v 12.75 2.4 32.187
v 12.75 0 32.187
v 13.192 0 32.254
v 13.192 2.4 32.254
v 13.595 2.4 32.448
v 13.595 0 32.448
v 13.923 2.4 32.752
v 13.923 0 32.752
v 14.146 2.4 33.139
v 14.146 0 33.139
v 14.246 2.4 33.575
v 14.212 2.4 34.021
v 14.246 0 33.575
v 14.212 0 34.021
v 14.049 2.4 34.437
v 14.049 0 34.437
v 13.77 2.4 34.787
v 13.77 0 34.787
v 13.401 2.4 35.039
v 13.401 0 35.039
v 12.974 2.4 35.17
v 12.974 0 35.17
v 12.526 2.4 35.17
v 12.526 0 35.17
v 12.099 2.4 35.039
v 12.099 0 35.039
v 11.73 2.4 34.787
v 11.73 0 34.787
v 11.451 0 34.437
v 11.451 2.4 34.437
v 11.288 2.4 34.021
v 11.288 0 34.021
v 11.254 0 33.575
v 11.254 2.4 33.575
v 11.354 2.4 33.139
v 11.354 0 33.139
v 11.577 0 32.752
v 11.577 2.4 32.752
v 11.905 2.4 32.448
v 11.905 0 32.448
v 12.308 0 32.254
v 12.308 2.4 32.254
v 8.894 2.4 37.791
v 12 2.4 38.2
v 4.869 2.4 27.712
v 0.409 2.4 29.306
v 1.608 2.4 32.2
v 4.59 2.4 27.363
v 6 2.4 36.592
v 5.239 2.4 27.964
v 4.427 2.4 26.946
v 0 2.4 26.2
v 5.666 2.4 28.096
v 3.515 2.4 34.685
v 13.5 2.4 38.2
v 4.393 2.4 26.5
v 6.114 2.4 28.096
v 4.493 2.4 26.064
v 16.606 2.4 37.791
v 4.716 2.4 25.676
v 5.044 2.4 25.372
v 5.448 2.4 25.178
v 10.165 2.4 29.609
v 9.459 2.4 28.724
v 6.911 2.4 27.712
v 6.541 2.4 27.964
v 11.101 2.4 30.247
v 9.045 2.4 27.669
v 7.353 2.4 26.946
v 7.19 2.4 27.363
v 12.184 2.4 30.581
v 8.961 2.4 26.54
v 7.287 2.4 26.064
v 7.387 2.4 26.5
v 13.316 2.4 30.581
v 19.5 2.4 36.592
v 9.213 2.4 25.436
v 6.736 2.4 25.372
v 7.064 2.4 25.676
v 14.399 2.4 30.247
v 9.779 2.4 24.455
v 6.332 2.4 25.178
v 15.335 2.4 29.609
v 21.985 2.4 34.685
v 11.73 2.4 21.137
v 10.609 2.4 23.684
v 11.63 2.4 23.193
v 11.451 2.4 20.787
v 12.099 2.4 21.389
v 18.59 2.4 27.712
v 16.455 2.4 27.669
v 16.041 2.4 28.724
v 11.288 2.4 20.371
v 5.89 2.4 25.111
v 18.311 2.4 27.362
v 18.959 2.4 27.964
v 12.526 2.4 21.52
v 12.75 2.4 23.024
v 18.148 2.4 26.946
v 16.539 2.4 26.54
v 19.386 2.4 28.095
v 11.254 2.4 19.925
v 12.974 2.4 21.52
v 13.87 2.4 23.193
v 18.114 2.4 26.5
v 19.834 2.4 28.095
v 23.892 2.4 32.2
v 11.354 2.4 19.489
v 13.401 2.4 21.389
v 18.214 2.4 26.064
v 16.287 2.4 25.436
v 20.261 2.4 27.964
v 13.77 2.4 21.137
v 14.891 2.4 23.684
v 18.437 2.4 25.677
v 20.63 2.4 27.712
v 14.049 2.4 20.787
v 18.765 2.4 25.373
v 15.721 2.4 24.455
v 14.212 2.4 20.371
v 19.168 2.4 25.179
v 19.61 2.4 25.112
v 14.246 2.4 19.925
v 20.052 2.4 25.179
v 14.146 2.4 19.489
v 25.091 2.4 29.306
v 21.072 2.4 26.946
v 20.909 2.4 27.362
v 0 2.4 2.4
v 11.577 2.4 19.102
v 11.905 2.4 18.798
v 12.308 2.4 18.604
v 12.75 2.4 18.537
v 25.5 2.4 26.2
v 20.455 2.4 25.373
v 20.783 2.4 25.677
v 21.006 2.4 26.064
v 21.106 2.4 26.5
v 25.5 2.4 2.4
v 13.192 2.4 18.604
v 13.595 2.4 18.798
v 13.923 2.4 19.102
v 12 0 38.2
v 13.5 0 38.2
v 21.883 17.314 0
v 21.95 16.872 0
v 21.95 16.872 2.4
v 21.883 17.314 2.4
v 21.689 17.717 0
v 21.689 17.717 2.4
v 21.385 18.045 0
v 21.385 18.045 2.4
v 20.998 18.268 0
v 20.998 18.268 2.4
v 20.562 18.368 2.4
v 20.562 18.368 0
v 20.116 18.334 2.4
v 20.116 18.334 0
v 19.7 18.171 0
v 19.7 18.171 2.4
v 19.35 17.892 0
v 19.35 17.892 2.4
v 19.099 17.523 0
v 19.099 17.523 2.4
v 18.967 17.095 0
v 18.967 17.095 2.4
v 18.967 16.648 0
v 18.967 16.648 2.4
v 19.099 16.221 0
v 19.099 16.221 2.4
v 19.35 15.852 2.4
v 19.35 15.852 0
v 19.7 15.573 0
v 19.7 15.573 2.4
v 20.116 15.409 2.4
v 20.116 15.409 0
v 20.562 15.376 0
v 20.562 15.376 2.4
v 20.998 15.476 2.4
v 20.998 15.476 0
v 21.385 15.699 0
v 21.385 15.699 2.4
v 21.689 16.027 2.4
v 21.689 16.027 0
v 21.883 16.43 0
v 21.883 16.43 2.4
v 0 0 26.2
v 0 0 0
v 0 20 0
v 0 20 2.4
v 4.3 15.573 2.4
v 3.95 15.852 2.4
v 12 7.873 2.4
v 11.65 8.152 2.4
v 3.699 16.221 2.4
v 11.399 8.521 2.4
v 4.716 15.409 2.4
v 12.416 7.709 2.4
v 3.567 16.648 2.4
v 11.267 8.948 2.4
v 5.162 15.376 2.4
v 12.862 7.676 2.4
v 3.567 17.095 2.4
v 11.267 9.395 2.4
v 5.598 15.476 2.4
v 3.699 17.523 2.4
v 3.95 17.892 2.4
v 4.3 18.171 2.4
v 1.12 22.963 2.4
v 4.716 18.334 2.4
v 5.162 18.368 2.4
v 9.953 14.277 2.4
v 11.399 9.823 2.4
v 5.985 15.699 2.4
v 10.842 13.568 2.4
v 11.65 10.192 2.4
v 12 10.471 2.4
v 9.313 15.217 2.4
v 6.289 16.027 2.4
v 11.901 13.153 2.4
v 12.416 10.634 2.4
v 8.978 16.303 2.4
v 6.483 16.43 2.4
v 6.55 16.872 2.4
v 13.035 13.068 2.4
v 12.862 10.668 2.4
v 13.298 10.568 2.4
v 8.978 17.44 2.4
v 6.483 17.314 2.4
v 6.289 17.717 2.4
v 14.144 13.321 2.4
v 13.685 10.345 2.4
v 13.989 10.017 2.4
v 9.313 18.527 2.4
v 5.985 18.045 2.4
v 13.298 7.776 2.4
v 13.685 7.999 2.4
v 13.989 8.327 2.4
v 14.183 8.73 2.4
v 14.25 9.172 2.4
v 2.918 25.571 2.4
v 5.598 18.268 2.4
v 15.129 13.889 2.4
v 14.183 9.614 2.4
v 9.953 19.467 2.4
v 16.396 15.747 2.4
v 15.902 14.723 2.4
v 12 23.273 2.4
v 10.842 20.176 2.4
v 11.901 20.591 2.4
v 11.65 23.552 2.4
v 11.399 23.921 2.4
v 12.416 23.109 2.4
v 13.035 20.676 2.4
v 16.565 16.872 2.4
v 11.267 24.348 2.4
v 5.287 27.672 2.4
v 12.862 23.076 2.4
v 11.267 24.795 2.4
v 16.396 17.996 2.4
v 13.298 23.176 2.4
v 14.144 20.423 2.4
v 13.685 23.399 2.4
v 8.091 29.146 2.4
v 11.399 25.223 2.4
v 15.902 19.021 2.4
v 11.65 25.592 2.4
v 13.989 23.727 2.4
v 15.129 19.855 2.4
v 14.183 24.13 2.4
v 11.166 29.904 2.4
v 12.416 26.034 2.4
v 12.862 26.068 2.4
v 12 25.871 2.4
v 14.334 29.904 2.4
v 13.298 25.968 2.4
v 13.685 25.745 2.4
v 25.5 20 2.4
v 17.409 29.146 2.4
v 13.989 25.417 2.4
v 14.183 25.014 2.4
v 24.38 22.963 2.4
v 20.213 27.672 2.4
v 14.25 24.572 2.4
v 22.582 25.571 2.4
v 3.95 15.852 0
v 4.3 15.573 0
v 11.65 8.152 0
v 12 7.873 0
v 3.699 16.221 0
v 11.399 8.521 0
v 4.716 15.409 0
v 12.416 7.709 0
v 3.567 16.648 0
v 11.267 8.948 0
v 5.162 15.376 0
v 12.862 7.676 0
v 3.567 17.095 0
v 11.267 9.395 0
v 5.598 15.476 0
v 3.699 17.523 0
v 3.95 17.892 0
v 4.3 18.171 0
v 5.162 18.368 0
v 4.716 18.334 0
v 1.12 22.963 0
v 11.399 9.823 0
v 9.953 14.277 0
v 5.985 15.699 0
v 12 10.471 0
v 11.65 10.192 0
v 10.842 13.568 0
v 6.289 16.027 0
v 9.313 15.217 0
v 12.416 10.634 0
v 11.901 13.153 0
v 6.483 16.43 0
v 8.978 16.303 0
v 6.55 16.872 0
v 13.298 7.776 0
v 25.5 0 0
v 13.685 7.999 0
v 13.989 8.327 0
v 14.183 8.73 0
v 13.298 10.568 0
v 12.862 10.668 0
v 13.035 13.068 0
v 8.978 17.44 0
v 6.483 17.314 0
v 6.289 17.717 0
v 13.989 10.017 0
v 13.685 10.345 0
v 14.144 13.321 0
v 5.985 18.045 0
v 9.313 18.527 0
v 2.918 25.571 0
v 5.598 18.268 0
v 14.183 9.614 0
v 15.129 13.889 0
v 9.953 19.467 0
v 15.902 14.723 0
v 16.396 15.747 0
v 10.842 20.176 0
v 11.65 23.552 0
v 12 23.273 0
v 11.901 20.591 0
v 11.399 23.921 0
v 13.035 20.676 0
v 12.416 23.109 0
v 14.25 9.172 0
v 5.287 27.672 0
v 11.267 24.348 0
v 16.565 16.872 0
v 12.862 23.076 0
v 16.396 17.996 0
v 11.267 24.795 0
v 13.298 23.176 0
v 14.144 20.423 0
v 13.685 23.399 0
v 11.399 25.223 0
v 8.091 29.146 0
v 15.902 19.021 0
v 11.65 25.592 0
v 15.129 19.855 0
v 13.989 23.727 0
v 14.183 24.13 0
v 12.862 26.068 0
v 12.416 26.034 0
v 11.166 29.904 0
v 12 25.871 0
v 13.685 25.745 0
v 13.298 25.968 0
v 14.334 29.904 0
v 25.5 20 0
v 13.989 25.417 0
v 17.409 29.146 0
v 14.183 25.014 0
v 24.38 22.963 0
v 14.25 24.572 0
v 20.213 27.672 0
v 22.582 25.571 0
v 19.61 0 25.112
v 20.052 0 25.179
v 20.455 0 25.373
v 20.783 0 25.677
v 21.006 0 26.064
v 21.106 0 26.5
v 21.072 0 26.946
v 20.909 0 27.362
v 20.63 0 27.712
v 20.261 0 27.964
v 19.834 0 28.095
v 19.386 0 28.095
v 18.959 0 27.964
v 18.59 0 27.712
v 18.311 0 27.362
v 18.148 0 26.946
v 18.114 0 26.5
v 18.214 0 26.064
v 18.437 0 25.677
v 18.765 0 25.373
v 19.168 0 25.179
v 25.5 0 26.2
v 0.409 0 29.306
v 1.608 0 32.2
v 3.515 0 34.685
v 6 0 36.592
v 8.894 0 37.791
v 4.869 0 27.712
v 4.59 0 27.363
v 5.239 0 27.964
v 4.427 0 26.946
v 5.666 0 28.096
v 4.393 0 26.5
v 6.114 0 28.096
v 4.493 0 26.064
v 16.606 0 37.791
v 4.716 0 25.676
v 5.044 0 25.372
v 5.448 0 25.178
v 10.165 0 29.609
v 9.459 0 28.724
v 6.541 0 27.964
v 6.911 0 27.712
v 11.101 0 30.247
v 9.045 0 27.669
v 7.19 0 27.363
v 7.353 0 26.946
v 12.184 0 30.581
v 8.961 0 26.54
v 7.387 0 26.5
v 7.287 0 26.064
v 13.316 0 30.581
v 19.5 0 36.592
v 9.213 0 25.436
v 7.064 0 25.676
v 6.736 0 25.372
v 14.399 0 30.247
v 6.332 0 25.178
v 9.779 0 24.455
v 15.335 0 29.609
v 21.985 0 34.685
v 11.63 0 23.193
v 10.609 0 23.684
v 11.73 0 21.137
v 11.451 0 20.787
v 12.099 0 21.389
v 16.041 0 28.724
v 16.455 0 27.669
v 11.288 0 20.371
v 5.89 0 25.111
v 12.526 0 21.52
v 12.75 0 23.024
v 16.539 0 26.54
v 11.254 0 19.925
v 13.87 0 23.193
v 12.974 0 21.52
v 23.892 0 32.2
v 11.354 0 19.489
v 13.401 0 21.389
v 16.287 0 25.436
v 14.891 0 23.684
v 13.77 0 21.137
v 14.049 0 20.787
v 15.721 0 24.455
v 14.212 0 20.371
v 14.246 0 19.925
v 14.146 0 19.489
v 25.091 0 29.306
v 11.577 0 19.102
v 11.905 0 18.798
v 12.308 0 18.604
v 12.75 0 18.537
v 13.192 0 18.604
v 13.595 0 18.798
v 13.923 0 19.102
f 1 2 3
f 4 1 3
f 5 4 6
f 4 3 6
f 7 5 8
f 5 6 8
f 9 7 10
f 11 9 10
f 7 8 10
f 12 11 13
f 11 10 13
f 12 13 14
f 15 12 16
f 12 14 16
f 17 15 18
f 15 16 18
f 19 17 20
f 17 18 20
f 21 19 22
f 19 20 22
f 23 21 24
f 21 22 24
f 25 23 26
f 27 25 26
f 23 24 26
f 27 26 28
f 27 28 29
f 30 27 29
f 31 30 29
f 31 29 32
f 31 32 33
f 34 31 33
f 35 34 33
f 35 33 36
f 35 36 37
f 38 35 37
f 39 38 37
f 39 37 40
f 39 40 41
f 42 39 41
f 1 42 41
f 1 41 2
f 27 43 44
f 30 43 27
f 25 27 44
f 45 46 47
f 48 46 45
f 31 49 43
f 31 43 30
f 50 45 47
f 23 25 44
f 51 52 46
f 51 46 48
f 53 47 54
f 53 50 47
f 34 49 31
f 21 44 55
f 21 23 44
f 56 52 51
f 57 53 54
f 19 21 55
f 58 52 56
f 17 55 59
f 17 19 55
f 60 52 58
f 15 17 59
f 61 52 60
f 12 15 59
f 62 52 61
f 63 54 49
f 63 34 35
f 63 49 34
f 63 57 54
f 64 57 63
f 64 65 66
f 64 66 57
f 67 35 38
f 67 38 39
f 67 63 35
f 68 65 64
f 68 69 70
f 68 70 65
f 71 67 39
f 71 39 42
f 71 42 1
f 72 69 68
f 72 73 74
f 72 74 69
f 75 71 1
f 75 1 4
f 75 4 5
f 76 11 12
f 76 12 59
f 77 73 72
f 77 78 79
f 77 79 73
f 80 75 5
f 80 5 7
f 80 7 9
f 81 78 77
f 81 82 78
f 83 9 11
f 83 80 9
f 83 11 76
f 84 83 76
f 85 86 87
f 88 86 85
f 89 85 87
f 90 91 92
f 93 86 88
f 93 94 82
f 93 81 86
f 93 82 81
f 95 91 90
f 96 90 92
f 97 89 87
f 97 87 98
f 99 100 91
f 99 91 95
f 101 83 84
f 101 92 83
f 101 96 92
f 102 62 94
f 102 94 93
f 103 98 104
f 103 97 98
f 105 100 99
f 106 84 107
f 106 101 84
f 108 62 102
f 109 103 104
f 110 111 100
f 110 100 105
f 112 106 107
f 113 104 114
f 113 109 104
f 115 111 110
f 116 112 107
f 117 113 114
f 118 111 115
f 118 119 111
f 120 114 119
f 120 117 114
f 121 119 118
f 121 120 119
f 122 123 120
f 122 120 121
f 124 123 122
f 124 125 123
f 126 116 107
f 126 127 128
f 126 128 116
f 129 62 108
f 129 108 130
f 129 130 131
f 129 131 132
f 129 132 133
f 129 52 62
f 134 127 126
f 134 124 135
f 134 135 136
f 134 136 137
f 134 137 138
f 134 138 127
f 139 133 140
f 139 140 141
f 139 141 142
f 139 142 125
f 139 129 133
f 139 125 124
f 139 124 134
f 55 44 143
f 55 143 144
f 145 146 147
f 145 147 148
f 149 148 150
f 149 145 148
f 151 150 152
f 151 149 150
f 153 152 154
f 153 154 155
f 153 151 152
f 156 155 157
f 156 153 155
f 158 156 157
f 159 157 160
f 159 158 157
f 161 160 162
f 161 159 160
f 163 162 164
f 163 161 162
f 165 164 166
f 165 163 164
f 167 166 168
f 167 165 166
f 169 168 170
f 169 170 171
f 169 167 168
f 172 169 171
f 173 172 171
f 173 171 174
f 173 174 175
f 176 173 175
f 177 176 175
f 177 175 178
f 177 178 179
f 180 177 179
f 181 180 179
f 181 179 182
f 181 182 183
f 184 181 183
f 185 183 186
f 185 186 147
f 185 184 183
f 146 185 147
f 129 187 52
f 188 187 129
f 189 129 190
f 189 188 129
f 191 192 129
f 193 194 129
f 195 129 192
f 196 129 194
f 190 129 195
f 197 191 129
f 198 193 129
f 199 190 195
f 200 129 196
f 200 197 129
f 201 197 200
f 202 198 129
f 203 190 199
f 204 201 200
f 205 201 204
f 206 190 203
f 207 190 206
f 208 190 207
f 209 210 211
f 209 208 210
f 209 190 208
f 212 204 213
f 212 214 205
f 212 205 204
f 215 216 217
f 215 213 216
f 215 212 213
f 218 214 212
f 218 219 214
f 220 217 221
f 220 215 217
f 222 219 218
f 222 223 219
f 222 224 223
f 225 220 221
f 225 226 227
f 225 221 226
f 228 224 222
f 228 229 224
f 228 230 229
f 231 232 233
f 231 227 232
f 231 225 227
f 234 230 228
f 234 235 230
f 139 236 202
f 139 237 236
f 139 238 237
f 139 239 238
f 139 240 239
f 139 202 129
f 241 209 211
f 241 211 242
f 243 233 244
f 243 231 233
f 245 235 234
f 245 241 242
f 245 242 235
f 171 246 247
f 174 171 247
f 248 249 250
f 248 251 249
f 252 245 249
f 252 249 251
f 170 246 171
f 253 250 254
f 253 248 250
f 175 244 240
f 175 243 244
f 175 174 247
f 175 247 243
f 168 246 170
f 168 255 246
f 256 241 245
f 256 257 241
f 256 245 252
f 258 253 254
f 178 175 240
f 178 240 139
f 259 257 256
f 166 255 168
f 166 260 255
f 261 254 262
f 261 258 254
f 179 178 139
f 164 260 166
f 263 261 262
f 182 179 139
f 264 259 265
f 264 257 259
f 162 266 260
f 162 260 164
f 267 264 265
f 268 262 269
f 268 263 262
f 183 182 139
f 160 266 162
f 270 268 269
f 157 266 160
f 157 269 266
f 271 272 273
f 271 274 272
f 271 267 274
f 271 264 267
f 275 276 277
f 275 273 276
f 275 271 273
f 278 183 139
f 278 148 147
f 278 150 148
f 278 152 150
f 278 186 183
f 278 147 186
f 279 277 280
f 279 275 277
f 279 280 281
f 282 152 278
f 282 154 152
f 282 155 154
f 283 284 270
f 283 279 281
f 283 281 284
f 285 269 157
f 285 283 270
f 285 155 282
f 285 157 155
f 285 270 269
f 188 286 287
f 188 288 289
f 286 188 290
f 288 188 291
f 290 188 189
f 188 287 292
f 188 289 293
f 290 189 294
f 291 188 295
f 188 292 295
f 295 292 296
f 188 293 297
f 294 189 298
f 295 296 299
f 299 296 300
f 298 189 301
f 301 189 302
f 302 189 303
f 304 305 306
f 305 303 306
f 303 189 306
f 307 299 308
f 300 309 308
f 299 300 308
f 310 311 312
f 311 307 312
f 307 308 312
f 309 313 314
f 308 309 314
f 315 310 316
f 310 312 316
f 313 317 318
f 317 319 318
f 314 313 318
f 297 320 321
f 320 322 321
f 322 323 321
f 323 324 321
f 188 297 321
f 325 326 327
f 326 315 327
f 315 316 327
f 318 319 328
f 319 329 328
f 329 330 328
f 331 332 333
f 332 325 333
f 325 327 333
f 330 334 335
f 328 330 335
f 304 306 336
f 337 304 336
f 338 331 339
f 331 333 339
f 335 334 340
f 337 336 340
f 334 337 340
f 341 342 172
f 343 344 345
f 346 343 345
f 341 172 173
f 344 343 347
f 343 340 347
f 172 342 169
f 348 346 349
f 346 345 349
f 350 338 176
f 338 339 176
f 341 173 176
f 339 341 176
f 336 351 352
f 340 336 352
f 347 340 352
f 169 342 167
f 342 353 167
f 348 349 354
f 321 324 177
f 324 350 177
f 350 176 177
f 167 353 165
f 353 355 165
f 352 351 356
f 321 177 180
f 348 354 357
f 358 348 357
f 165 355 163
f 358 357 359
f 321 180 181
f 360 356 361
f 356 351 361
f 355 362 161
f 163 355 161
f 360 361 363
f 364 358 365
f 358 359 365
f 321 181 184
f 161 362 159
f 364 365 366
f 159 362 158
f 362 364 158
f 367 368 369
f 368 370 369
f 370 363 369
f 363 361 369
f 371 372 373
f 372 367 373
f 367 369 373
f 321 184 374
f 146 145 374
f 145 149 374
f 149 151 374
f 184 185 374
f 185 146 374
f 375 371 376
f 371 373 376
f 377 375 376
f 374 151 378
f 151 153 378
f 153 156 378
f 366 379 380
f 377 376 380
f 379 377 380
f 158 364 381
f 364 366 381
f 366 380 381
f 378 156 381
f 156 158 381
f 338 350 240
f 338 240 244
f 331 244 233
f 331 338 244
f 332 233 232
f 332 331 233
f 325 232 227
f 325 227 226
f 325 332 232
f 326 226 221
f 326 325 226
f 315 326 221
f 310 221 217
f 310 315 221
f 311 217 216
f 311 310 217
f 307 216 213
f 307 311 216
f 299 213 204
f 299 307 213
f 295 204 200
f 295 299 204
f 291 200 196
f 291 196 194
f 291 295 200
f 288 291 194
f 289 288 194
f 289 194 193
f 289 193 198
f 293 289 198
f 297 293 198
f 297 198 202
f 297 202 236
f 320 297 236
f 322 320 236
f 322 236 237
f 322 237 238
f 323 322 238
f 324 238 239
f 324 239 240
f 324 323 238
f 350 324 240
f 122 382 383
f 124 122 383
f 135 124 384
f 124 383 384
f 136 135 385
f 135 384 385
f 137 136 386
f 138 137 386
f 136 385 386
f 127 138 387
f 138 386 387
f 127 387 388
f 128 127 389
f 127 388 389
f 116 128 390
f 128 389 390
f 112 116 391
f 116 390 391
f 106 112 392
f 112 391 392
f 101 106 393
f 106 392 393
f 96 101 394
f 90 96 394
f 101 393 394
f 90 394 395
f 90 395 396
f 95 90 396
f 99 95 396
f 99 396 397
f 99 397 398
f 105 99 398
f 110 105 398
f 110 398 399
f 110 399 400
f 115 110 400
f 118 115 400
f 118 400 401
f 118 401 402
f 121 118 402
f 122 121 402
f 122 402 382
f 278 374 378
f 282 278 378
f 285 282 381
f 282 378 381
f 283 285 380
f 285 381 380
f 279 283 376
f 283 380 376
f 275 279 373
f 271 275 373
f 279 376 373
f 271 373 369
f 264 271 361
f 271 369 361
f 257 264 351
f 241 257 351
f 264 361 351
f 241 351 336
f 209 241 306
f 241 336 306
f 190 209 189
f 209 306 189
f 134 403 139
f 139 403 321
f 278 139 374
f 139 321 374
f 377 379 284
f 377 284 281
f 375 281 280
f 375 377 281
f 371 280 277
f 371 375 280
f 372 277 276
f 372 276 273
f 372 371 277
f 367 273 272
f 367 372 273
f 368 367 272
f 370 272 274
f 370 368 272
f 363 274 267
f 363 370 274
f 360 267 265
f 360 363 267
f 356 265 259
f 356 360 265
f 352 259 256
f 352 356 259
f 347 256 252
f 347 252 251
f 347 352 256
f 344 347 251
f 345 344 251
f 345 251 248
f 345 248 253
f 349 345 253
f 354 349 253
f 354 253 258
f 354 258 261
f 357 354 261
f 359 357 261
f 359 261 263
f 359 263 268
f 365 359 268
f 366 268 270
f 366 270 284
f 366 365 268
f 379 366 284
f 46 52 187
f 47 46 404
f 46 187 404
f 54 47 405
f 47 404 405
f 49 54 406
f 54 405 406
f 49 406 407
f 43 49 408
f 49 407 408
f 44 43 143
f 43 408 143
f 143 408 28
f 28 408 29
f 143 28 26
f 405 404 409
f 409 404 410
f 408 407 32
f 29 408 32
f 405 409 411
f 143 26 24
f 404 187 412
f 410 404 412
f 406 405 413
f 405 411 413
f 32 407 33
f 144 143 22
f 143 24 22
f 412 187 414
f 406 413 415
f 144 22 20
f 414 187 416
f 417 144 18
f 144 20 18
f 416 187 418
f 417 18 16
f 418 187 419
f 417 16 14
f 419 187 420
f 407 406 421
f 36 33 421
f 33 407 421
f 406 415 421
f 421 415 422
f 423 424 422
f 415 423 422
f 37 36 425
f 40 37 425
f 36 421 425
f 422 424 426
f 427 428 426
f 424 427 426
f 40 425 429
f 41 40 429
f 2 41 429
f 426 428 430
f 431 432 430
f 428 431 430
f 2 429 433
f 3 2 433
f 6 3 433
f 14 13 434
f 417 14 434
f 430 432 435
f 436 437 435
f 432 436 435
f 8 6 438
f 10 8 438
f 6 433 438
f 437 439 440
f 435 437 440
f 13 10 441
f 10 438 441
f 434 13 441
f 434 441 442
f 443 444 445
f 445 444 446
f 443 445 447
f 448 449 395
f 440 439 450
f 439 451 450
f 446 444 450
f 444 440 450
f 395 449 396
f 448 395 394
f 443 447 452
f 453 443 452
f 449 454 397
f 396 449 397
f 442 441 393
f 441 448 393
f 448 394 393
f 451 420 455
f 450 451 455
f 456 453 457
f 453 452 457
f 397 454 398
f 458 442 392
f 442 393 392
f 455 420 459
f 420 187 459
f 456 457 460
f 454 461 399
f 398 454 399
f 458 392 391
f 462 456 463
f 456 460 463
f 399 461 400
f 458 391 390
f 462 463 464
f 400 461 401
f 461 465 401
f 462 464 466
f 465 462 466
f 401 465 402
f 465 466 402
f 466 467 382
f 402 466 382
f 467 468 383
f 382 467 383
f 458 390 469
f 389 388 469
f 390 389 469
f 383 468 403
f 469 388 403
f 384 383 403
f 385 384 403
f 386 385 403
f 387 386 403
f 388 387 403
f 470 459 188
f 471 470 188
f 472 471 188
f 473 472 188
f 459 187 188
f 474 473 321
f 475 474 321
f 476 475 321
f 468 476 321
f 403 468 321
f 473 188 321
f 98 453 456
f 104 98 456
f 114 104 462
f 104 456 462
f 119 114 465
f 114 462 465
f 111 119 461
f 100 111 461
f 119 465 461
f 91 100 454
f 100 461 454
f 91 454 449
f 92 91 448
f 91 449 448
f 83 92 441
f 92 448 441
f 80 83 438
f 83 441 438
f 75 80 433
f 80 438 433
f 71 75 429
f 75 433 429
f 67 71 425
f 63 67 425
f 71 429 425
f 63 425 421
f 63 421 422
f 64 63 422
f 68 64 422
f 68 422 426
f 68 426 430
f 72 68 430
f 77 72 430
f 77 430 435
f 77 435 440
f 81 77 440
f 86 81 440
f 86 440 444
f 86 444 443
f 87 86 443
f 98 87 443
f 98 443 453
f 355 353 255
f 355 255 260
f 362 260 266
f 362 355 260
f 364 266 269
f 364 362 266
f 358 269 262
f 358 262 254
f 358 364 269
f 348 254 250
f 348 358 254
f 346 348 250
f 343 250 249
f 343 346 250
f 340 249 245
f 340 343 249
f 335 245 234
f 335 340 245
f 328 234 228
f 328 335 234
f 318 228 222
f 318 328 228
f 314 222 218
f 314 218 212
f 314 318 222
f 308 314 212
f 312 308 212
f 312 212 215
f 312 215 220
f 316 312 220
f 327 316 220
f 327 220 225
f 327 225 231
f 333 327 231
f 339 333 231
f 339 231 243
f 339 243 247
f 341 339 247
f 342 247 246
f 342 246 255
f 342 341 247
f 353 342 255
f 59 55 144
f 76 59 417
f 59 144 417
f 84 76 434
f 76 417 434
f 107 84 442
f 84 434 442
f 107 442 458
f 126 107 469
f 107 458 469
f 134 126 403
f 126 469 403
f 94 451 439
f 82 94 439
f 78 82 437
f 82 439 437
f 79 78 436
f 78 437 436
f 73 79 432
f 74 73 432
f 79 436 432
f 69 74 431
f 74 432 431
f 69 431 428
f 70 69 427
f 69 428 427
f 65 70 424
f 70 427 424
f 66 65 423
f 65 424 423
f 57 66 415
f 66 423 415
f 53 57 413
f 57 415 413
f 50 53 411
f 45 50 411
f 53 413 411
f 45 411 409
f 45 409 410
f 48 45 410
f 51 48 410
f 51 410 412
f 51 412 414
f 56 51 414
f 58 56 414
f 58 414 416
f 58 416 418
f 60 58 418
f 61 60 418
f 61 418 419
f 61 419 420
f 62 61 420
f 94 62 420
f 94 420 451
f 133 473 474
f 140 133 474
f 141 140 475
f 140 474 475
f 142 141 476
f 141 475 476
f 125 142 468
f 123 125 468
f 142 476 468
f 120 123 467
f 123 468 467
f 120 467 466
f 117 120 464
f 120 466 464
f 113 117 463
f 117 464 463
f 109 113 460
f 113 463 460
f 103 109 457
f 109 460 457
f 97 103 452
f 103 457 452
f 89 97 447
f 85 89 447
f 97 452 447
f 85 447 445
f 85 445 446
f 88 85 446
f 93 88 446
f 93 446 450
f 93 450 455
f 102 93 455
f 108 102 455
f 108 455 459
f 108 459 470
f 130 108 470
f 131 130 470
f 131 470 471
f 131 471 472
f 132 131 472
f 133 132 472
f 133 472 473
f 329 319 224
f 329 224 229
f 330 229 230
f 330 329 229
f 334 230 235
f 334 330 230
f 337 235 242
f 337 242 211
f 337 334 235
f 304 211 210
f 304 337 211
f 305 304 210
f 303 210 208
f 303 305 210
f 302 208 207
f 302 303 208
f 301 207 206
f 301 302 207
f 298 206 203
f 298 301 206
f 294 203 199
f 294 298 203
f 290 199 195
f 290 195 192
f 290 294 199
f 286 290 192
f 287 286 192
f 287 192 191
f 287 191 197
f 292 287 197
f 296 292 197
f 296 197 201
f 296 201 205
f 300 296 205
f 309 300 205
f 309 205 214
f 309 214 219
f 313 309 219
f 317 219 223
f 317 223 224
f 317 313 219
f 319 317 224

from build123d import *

# Parameters (mm, degrees)
SKETCH1_R           = 1.5
SKETCH1_R_2         = 3.815
BOSS_EXTRUDE1_DEPTH = 2.4
SKETCH2_W           = 25.5
SKETCH2_H           = 2.4
BOSS_EXTRUDE2_DEPTH = 35.8
CUT_EXTRUDE1_DEPTH  = 35.8
SKETCH4_R           = 3.8
SKETCH4_R_2         = 1.500976088
SKETCH4_R_3         = 1.5
CUT_EXTRUDE2_DEPTH  = 35.8


with BuildPart() as part:
    # Sketch1 → Boss-Extrude1 (new body)
    with BuildSketch(Plane.XY):
        with BuildLine():
            Line((0, 0), (25.5, 0))
            Line((25.5, 0), (25.5, 20))
            ThreePointArc((25.5, 20), (12.75, 30), (0, 20))
            Line((0, 20), (0, 0))
        make_face()
        with Locations((12.75, 24.571875)):
            Circle(SKETCH1_R, mode=Mode.SUBTRACT)
        with Locations((12.75, 16.871875)):
            Circle(SKETCH1_R_2, mode=Mode.SUBTRACT)
        with Locations((20.45, 16.871875)):
            Circle(SKETCH1_R, mode=Mode.SUBTRACT)
        with Locations((12.75, 9.171875)):
            Circle(SKETCH1_R, mode=Mode.SUBTRACT)
        with Locations((5.05, 16.871875)):
            Circle(SKETCH1_R, mode=Mode.SUBTRACT)
    extrude(amount=BOSS_EXTRUDE1_DEPTH)

    # Sketch2 → Boss-Extrude2 (add)
    with BuildSketch(Plane.XY.offset(2.4)):
        with Locations((12.75, 1.2)):
            Rectangle(SKETCH2_W, SKETCH2_H)
    extrude(amount=BOSS_EXTRUDE2_DEPTH)

    # Sketch3 → Cut-Extrude1 (cut)
    with BuildSketch(Plane.XZ):
        with BuildLine():
            ThreePointArc((0, 26.2), (3.514718626, 34.685281374), (12, 38.2))
            Line((12, 38.2), (0, 38.2))
            Line((0, 38.2), (0, 26.2))
        make_face()
        with BuildLine():
            Line((25.5, 38.2), (13.5, 38.2))
            ThreePointArc((13.5, 38.2), (21.985281374, 34.685281374), (25.5, 26.2))
            Line((25.5, 26.2), (25.5, 38.2))
        make_face()
    extrude(amount=-CUT_EXTRUDE1_DEPTH, mode=Mode.SUBTRACT)

    # Sketch4 → Cut-Extrude2 (cut)
    with BuildSketch(Plane.XZ):
        with Locations(Location((12.75, 26.823800226, 0), (0, 0, 270))):
            Circle(SKETCH4_R)
        with Locations(Location((5.89, 26.612165956, 0), (0, 0, 270))):
            Circle(SKETCH4_R_2)
        with Locations(Location((19.61, 26.612165956, 0), (0, 0, 270))):
            Circle(SKETCH4_R_3)
        with Locations(Location((12.75, 33.687165956, 0), (0, 0, 270))):
            Circle(SKETCH4_R_3)
        with Locations(Location((12.75, 20.037167493, 0), (0, 0, 270))):
            Circle(SKETCH4_R_3)
    extrude(amount=-CUT_EXTRUDE2_DEPTH, mode=Mode.SUBTRACT)


solid = part.part
